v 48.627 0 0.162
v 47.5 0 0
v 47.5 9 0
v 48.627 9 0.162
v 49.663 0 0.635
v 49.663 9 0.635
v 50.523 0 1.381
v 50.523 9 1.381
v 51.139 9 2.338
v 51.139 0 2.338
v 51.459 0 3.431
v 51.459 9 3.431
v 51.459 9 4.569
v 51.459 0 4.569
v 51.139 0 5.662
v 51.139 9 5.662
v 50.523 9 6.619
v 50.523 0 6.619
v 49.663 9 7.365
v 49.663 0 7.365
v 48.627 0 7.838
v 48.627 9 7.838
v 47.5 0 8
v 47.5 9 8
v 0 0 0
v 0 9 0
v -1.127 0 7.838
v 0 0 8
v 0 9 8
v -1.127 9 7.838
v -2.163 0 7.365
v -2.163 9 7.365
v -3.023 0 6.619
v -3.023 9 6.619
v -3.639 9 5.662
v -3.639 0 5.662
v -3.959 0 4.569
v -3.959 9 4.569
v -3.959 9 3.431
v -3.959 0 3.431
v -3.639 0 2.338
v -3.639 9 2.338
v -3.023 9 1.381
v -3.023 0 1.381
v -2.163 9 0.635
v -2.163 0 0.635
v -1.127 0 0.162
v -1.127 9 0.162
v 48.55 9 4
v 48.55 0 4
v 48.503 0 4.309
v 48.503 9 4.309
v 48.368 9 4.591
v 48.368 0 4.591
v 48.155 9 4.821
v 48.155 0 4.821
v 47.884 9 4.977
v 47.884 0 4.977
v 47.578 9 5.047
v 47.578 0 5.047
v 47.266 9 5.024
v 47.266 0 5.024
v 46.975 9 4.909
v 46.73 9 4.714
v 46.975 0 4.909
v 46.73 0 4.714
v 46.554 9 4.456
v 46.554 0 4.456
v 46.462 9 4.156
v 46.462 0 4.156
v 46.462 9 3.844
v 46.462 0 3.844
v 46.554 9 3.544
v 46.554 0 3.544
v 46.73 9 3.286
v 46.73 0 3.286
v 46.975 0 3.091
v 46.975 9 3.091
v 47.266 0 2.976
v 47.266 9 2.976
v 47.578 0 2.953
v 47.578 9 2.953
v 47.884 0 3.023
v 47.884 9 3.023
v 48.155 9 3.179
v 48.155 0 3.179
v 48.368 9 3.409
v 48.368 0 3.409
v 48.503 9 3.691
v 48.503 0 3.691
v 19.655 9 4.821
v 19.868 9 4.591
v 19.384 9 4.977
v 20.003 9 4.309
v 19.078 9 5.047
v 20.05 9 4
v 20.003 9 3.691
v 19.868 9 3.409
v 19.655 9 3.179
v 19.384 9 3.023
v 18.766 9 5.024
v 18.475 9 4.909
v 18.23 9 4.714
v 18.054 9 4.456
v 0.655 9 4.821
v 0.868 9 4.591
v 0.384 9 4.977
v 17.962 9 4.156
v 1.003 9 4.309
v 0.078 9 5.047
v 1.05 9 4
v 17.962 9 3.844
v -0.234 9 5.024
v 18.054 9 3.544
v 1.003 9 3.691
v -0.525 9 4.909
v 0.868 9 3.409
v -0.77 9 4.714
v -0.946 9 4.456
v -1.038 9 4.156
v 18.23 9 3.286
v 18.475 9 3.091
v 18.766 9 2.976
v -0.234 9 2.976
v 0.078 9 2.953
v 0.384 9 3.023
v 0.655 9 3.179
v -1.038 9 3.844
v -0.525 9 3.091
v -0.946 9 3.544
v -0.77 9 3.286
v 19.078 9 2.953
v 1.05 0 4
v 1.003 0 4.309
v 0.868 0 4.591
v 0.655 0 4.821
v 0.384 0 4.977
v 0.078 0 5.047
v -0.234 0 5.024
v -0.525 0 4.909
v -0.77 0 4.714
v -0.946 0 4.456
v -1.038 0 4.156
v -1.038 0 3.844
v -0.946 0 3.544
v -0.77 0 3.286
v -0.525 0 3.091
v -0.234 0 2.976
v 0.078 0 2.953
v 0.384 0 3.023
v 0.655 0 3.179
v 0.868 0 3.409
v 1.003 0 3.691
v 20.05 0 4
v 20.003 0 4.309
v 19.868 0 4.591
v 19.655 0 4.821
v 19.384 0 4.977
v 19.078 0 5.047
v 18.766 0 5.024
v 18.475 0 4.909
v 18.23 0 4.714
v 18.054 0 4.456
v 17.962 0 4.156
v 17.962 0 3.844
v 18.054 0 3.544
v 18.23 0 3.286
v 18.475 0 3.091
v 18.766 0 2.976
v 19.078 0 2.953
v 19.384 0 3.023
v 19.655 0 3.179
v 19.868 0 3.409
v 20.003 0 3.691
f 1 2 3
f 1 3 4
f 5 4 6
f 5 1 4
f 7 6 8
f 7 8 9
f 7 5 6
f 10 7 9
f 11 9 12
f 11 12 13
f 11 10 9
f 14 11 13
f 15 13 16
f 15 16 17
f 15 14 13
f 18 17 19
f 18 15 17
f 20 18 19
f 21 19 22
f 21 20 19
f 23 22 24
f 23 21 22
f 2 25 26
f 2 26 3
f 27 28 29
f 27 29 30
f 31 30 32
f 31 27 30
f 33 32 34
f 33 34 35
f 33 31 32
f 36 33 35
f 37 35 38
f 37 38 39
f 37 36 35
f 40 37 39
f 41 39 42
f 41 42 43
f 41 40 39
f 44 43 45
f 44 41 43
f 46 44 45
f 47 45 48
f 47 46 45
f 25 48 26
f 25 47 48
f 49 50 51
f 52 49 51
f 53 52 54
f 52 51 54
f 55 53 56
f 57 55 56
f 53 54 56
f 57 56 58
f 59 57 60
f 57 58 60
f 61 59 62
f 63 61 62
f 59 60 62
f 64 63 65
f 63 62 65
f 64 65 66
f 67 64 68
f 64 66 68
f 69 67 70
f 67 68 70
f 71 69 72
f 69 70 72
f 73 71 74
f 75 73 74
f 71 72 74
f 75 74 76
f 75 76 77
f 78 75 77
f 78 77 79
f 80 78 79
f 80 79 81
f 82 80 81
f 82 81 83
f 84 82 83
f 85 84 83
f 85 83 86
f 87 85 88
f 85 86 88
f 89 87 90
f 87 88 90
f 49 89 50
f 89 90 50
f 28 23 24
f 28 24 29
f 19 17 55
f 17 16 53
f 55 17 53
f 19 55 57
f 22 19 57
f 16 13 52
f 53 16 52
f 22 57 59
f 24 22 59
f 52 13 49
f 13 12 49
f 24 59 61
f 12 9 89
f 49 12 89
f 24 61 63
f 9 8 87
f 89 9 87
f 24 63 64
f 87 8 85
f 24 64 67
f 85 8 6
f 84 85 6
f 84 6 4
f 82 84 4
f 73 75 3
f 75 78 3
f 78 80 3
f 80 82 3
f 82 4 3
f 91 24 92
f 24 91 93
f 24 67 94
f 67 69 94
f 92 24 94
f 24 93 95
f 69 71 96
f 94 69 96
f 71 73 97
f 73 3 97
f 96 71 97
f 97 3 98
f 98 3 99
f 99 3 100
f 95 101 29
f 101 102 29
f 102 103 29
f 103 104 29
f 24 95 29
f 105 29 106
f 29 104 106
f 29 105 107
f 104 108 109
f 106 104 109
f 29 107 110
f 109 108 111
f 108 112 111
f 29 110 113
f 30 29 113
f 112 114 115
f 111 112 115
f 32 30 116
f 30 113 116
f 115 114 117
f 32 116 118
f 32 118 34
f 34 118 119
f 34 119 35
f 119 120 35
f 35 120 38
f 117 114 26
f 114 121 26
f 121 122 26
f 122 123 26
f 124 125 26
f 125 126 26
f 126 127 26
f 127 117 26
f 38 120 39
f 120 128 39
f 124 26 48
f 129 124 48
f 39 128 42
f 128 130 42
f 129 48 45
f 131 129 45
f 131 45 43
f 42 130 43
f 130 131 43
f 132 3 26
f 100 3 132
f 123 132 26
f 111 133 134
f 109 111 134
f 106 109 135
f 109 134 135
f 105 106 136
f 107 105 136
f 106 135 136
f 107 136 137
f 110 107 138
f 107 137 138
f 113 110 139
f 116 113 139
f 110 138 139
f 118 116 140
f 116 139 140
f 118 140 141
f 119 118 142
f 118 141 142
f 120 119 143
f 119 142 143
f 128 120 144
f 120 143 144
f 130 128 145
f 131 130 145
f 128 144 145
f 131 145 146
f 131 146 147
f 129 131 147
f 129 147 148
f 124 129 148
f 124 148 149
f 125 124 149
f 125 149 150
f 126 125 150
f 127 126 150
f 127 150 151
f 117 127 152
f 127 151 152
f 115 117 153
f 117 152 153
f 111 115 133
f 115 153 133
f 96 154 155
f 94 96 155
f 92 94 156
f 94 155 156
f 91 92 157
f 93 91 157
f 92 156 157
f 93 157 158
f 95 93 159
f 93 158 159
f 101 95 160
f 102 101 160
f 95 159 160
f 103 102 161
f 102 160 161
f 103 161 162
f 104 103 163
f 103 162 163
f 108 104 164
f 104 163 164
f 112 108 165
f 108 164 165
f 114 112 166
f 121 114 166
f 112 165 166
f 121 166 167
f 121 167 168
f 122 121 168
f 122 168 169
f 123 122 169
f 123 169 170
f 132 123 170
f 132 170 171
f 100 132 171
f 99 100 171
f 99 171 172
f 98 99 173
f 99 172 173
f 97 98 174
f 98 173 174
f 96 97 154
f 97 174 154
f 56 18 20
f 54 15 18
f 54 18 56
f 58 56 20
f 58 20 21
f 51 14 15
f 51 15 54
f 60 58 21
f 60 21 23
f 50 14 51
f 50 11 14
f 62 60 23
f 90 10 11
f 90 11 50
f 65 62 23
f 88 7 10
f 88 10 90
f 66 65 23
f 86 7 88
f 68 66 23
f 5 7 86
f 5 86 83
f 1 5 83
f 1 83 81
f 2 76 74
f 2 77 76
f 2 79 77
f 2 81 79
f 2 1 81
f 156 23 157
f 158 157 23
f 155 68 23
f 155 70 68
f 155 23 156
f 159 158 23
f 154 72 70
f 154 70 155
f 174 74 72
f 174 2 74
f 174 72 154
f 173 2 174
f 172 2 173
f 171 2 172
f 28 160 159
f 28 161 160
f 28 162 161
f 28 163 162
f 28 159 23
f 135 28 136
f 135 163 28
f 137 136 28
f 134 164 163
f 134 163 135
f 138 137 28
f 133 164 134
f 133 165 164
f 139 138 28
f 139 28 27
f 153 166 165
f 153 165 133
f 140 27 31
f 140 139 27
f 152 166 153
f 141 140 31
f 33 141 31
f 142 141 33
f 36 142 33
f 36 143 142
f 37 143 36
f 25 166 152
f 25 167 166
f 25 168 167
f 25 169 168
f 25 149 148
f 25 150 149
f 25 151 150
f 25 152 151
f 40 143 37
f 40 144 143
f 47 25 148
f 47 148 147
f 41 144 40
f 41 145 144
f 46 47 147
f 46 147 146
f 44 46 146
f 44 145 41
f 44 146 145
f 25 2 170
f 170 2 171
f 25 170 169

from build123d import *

# Parameters (mm, degrees)
EXTRUDE_1_DEPTH     = 9
SKETCH_3_R          = 1.05
CUT_EXTRUDE_1_DEPTH = 9


with BuildPart() as part:
    # 草图2 → 凸台-拉伸1 (new body)
    with BuildSketch(Plane(origin=(0, 0, 0), x_dir=(1, 0, 0), z_dir=(0, 1, 0))):
        with BuildLine():
            Line((0, 0), (47.5, 0))
            ThreePointArc((47.5, 0), (51.5, -4), (47.5, -8))
            Line((47.5, -8), (0, -8))
            ThreePointArc((0, -8), (-4, -4), (0, 0))
        make_face()
    extrude(amount=EXTRUDE_1_DEPTH)

    # 草图3 → 切除-拉伸1 (cut)
    with BuildSketch(Plane.XZ):
        with Locations((0, 4)):
            Circle(SKETCH_3_R)
        with Locations((19, 4)):
            Circle(SKETCH_3_R)
        with Locations((47.5, 4)):
            Circle(SKETCH_3_R)
    extrude(amount=-CUT_EXTRUDE_1_DEPTH, mode=Mode.SUBTRACT)


solid = part.part
